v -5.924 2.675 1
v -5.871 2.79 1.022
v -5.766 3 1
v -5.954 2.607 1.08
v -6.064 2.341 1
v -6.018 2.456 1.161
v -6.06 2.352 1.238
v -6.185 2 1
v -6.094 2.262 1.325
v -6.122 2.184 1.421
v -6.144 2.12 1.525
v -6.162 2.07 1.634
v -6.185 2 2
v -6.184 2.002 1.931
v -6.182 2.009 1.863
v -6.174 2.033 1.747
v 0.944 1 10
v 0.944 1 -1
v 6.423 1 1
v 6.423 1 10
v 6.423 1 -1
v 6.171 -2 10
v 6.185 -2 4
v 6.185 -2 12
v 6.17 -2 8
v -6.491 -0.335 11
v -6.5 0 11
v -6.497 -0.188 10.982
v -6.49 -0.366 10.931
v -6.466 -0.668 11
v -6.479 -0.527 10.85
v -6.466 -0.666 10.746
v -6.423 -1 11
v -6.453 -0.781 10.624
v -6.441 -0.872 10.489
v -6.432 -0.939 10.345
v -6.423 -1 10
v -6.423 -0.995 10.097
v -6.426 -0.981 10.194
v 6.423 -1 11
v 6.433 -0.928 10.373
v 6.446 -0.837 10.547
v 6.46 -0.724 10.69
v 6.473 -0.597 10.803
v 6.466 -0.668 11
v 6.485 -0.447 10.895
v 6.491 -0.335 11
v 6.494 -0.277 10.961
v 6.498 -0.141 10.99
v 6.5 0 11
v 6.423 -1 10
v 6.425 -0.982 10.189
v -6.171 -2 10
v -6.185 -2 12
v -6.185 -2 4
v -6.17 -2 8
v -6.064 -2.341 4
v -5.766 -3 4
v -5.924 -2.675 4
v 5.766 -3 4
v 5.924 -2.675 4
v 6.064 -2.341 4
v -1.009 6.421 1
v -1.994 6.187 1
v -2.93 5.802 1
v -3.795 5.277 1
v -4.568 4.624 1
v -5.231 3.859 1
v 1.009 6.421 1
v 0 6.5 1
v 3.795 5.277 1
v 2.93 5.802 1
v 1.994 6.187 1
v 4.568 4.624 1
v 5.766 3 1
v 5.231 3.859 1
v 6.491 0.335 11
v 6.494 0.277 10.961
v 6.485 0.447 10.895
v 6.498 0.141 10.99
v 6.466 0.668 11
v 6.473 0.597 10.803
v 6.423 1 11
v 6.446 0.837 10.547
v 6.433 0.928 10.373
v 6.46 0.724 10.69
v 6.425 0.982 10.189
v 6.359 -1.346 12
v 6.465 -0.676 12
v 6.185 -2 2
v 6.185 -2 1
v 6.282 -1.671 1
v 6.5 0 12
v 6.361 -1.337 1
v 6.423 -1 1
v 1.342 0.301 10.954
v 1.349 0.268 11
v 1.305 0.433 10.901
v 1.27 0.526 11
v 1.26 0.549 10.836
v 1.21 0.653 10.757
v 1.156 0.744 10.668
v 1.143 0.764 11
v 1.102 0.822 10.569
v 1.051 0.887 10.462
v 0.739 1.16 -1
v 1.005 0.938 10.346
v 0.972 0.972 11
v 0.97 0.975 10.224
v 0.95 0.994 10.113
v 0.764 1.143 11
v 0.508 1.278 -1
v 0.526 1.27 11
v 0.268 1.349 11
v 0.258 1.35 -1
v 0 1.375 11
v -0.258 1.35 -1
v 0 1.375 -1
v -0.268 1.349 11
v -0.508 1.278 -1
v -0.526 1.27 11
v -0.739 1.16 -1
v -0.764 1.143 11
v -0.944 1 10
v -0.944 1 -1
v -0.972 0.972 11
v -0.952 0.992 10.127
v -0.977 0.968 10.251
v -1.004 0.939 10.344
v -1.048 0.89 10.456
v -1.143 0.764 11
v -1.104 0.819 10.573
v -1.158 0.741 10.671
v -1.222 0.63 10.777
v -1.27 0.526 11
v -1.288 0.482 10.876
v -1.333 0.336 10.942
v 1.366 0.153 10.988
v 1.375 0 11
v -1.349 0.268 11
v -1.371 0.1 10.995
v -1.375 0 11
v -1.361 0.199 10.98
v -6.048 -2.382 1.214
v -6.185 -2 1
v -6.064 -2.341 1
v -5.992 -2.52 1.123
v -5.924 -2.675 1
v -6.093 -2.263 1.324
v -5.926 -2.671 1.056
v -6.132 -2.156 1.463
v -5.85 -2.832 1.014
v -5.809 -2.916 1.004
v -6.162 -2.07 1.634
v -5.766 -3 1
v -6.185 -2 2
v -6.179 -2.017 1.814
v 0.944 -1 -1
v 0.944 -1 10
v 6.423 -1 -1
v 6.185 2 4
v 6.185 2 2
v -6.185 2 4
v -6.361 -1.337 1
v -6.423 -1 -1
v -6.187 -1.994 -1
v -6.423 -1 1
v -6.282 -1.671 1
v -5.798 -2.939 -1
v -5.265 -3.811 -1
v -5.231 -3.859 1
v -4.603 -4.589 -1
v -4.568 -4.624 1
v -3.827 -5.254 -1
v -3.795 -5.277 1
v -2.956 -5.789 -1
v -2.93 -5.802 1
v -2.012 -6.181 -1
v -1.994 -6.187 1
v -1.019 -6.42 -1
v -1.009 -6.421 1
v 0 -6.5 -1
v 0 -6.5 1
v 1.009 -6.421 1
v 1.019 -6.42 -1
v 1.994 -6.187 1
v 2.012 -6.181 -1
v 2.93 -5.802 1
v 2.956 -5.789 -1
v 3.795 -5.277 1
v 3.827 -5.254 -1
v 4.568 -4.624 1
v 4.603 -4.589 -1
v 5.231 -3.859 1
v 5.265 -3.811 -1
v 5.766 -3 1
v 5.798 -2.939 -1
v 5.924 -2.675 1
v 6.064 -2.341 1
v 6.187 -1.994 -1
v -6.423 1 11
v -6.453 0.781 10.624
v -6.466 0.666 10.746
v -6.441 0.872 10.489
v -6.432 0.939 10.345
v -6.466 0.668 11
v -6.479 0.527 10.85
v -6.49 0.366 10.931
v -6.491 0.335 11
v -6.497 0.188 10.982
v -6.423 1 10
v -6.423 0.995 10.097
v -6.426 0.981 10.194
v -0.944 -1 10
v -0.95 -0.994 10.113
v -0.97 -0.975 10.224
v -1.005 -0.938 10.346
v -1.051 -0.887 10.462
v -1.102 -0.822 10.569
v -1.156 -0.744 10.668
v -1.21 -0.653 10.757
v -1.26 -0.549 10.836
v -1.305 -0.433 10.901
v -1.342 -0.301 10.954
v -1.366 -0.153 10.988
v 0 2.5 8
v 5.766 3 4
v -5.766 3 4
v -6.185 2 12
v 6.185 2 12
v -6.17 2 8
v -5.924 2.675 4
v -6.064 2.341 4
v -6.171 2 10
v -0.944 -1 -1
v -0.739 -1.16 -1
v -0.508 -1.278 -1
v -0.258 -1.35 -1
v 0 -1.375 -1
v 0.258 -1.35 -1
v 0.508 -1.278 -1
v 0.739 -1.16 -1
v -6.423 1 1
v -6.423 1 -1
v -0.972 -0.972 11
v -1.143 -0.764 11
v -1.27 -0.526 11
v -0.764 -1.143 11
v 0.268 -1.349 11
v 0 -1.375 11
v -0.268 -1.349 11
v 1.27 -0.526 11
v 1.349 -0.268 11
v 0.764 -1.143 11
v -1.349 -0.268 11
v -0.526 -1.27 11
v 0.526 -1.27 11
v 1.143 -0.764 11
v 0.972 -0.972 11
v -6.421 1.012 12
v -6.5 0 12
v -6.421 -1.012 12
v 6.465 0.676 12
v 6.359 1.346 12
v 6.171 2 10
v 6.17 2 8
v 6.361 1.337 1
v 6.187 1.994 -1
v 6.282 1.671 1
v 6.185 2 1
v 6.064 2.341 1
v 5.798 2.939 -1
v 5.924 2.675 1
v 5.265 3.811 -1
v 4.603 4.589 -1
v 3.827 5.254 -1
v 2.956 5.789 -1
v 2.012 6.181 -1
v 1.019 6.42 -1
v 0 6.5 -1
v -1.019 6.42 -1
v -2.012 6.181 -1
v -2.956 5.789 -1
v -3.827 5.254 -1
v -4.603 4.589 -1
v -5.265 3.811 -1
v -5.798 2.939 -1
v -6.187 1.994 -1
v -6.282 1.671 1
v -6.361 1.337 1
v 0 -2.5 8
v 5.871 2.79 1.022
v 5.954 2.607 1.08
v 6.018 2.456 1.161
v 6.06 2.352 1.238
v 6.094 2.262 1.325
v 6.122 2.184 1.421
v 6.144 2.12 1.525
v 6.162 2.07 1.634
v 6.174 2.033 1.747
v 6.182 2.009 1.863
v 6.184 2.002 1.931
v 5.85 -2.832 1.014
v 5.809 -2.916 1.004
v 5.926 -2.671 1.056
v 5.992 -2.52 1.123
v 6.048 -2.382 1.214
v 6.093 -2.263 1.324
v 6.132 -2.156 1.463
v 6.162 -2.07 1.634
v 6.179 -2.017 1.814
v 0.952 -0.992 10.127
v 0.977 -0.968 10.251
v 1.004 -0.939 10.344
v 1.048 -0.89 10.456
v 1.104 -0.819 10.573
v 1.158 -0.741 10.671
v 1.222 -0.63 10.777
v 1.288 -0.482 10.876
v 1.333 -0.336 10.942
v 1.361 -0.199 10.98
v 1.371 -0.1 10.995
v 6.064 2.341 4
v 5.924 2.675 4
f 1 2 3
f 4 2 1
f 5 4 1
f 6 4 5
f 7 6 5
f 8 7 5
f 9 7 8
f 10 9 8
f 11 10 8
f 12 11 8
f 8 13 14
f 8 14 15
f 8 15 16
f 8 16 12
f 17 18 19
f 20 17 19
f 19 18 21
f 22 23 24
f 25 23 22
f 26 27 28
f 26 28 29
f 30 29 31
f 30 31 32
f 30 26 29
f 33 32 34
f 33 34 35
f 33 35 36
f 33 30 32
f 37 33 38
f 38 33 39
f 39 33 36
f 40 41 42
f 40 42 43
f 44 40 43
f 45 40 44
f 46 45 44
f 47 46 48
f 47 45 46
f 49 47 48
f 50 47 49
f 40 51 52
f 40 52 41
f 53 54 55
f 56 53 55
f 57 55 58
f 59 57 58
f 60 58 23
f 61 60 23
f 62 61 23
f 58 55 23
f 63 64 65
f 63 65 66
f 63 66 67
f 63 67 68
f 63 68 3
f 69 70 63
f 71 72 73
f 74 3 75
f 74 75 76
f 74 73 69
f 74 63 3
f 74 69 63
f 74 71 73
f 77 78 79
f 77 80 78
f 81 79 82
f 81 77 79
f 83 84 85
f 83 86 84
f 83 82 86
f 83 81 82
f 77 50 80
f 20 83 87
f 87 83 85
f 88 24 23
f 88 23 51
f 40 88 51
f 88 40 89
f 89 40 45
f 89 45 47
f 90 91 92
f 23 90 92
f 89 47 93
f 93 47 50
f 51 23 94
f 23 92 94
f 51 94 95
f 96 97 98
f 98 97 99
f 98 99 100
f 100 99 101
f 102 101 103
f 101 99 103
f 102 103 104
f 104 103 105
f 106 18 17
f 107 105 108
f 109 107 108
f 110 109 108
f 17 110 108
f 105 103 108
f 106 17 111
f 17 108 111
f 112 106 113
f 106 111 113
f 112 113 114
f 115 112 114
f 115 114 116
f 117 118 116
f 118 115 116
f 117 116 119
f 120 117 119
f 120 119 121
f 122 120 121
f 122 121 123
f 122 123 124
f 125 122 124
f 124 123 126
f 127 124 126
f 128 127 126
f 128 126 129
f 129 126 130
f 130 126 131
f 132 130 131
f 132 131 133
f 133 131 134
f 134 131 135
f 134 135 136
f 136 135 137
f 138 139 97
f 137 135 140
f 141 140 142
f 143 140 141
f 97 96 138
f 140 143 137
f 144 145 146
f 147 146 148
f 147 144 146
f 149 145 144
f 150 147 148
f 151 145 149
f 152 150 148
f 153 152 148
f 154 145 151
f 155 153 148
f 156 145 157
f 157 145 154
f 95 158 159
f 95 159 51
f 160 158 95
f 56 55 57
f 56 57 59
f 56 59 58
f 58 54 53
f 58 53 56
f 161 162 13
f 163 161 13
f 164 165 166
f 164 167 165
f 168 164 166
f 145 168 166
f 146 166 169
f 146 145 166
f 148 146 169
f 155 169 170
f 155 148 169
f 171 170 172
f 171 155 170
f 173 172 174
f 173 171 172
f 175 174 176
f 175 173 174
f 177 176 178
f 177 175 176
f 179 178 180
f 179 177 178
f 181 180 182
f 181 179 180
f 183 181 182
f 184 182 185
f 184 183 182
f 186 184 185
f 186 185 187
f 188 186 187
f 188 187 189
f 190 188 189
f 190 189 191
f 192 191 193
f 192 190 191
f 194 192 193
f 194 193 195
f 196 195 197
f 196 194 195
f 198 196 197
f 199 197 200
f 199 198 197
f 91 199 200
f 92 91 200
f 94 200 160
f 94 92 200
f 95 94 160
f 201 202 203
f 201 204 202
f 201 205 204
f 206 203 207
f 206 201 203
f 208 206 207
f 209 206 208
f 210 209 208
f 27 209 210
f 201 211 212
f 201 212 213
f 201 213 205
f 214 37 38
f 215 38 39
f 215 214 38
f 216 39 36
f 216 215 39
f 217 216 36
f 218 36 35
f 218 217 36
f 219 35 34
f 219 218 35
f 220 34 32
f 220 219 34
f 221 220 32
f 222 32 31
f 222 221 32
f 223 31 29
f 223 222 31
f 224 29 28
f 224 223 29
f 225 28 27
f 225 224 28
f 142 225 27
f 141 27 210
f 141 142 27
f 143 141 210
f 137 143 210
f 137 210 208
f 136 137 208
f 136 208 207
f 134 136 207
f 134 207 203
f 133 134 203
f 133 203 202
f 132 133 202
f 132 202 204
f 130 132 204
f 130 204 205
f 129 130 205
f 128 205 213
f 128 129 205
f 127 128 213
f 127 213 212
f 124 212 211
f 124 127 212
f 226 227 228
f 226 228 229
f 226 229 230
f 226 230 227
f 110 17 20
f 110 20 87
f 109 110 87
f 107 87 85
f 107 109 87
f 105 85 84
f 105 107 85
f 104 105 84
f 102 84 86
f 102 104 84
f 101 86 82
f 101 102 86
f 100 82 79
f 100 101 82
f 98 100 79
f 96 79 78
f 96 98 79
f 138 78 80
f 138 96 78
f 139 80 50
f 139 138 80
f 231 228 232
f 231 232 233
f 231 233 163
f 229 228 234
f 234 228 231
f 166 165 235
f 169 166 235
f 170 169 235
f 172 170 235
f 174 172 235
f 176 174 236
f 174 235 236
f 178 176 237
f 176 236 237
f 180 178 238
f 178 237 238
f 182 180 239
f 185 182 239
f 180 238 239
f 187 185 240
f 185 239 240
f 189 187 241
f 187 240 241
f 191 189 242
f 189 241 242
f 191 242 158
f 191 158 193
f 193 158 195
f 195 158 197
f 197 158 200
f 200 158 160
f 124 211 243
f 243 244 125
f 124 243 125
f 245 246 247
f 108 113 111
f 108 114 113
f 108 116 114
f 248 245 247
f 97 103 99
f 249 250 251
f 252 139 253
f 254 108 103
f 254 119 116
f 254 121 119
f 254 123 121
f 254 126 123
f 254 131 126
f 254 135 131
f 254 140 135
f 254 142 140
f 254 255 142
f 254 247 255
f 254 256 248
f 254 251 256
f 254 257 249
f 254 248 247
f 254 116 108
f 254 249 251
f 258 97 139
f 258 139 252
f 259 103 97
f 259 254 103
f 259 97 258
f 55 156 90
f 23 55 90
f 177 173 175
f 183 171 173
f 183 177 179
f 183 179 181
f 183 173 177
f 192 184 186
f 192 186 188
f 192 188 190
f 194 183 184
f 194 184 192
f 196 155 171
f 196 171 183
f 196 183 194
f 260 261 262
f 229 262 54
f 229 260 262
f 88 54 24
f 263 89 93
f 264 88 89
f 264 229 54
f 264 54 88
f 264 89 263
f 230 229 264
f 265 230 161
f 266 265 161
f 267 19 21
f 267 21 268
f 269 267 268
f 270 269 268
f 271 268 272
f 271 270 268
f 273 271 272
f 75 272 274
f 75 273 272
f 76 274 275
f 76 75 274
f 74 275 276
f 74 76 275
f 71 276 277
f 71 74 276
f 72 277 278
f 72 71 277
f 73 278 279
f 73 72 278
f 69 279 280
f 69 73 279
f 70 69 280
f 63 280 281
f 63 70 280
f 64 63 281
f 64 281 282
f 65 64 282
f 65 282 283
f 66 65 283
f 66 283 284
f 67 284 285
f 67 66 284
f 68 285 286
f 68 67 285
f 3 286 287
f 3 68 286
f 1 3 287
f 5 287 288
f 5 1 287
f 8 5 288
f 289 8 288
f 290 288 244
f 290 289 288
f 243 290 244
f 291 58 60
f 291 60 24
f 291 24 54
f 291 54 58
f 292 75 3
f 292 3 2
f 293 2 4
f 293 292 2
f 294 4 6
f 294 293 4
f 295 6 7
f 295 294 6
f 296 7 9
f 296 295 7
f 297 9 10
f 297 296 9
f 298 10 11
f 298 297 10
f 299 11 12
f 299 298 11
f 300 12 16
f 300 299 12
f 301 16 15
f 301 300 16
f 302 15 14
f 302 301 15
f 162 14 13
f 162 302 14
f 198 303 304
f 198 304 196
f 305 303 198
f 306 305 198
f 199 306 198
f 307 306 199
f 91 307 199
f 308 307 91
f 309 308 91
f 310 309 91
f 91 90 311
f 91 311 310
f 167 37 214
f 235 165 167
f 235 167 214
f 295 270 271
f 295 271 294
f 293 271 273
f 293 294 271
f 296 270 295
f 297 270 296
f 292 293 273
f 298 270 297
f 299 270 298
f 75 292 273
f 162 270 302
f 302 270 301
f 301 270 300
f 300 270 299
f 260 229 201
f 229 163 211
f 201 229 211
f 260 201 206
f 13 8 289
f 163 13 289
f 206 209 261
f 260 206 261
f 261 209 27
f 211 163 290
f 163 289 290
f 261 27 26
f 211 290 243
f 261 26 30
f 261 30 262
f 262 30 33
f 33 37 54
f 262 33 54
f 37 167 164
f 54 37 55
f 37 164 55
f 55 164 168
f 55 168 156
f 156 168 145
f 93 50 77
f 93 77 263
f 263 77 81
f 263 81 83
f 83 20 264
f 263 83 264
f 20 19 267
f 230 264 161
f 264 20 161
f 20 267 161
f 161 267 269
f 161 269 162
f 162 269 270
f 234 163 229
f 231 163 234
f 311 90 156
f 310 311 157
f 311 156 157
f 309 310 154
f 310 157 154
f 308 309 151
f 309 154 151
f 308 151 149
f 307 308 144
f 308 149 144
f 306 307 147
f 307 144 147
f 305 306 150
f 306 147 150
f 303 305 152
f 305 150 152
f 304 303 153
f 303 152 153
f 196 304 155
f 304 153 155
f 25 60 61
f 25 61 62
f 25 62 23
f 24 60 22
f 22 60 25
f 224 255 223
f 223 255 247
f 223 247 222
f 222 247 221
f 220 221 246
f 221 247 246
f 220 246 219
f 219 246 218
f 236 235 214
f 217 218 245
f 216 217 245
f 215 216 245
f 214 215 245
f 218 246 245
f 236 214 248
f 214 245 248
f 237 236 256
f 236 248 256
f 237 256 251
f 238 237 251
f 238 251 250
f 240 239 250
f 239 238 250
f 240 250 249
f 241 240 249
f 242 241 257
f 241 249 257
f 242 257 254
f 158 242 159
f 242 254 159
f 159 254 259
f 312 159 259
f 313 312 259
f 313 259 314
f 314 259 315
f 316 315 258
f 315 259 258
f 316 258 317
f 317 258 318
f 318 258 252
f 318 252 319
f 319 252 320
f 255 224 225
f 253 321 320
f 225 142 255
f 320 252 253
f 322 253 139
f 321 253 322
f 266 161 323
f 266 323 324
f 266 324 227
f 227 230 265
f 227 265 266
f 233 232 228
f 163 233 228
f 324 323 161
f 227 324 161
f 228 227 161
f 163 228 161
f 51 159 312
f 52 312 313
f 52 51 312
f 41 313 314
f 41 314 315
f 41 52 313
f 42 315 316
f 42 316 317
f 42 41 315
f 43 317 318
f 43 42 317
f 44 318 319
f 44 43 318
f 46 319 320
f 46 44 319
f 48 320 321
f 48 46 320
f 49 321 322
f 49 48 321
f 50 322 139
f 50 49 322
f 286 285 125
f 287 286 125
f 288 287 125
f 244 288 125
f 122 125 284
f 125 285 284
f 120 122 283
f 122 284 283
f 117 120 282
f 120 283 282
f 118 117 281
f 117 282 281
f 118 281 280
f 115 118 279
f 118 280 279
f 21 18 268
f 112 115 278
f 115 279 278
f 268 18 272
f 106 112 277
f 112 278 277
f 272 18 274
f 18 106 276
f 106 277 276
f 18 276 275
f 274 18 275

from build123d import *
from build123d import SkipClean  # not in build123d's __all__

# Parameters (mm, degrees)
F0_R          = 6.5
F1_DEPTH      = 1
F3_DEPTH      = 11
F7_R          = 1.375
F8_DEPTH      = 12
F9_W          = 46.4800073215
F9_H          = 2
F10_DEPTH     = 12
F11_T4_DEPTH  = 10.4788869849
F11_S5_R      = 1.375
F11_T6_DEPTH  = 7
F11_S7_R      = 6.5
F11_T8_DEPTH  = 7
F11_T12_DEPTH = 10.4788869849
F11_S13_R     = 6.5
F11_T14_DEPTH = 7
F11_S15_R     = 1.375
F11_T16_DEPTH = 7
F11_T20_DEPTH = 10.4788869849
F11_S21_R     = 1.375
F11_T22_DEPTH = 7
F11_S23_R     = 6.5
F11_T24_DEPTH = 7
F11_T28_DEPTH = 10.4788869849
F11_S29_R     = 1.375
F11_T30_DEPTH = 7
F11_S31_R     = 6.5
F11_T32_DEPTH = 7
F11_T36_DEPTH = 17.3693168769
F11_S37_R     = 6.5
F11_T38_DEPTH = 10
F11_T42_DEPTH = 17.3693168769
F11_S43_R     = 6.5
F11_T44_DEPTH = 10


# Not quite as in the source:
# - a fillet or chamfer that OpenCascade refuses, or shapes differently, is made with other operations: its cross-section is extruded or revolved along the edge and cut away or added
# - after a boolean that leaves OpenCascade's solid faulty, fix() repairs it


with BuildPart() as f1:
    # F0 (on Top) → F1 (new body, symmetric)
    with BuildSketch(Plane.XY):
        Circle(F0_R)
    extrude(amount=F1_DEPTH, both=True)

    # F2 (on face) → F3 (join)
    with BuildSketch(Plane.XY.offset(1)):
        with BuildLine():
            ThreePointArc((6.5, 0), (6.4206806434, 1.0123537302), (6.1846584384, 2))
            Line((6.1846584384, 2), (-6.1846584384, 2))
            ThreePointArc((-6.1846584384, 2), (-6.5, 0), (-6.1846584384, -2))
            Line((-6.1846584384, -2), (6.1846584384, -2))
            ThreePointArc((6.1846584384, -2), (6.4206806434, -1.0123537302), (6.5, 0))
        make_face()
    with SkipClean():  # cleaning this boolean's faces spoils the solid; the shape is the same uncleaned
        extrude(amount=F3_DEPTH)

    # F5 (on offset) → F6 section 0
    with BuildSketch(Plane.XY.offset(4)):
        with BuildLine():
            ThreePointArc((5.7662812973, -3), (6.5, 0), (5.7662812973, 3))
            Line((5.7662812973, 3), (-5.7662812973, 3))
            ThreePointArc((-5.7662812973, 3), (-6.5, 0), (-5.7662812973, -3))
            Line((-5.7662812973, -3), (5.7662812973, -3))
        make_face()
    # F3_face (on face) → F6 section 1
    with BuildSketch(Plane.XY.offset(12)):
        with BuildLine():
            ThreePointArc((6.1846584384, -2), (6.5, 0), (6.1846584384, 2))
            Line((6.1846584384, 2), (-6.1846584384, 2))
            ThreePointArc((-6.1846584384, 2), (-6.5, 0), (-6.1846584384, -2))
            Line((-6.1846584384, -2), (6.1846584384, -2))
        make_face()
    loft()

    add(f1.part.fix(), mode=Mode.REPLACE)

    # F7 (on face) → F8 (cut)
    with BuildSketch(Plane(origin=(0, 0, -1), x_dir=(1, 0, 0), z_dir=(0, 0, -1))):
        Circle(F7_R)
    extrude(amount=-F8_DEPTH, mode=Mode.SUBTRACT)

    # F9 (on face) → F10 (cut)
    with BuildSketch(Plane(origin=(0, 0, -1), x_dir=(1, 0, 0), z_dir=(0, 0, -1))):
        Rectangle(F9_W, F9_H)
    extrude(amount=-F10_DEPTH, mode=Mode.SUBTRACT)

    # F11: fillet of radius 1 on 8 edges, made by hand


with BuildPart() as f11_tool2:
    # F11_s3 → F11_t4 (new body)
    with BuildSketch(Plane.YZ.offset(-8.9226162893)):
        with BuildLine():
            ThreePointArc((0, 11), (0.7071067812, 10.7071067812), (1, 10))
            Line((1, 10), (1, 11))
            Line((1, 11), (0, 11))
        make_face()
    extrude(amount=F11_T4_DEPTH)

    # F11_s5 → F11_t6 (cut, symmetric)
    with BuildSketch(Plane.XY.offset(10.5)):
        Circle(F11_S5_R)
    extrude(amount=F11_T6_DEPTH, both=True, mode=Mode.SUBTRACT)

    # F11_s7 → F11_t8 (intersect, symmetric)
    with BuildSketch(Plane.XY.offset(10.5)):
        Circle(F11_S7_R)
    extrude(amount=F11_T8_DEPTH, both=True, mode=Mode.INTERSECT)


with BuildPart() as f1_1:
    add(f1.part, clean=False)

    # F11_t1: union F11_tool2
    add(f11_tool2.part)


with BuildPart() as f11_tool10:
    # F11_s11 → F11_t12 (new body)
    with BuildSketch(Plane.YZ.offset(-1.5562706956)):
        with BuildLine():
            ThreePointArc((1, 10), (0.7071067812, 10.7071067812), (0, 11))
            Line((0, 11), (1, 11))
            Line((1, 11), (1, 10))
        make_face()
    extrude(amount=F11_T12_DEPTH)

    # F11_s13 → F11_t14 (intersect, symmetric)
    with BuildSketch(Plane.XY.offset(10.5)):
        Circle(F11_S13_R)
    extrude(amount=F11_T14_DEPTH, both=True, mode=Mode.INTERSECT)

    # F11_s15 → F11_t16 (cut, symmetric)
    with BuildSketch(Plane.XY.offset(10.5)):
        Circle(F11_S15_R)
    extrude(amount=F11_T16_DEPTH, both=True, mode=Mode.SUBTRACT)


with BuildPart() as f1_2:
    add(f1_1.part, clean=False)

    # F11_t9: union F11_tool10
    add(f11_tool10.part)


with BuildPart() as f11_tool18:
    # F11_s19 → F11_t20 (new body)
    with BuildSketch(Plane.YZ.offset(8.9226162893)):
        with BuildLine():
            ThreePointArc((-1, 10), (-0.7071067812, 10.7071067812), (0, 11))
            Line((0, 11), (-1, 11))
            Line((-1, 11), (-1, 10))
        make_face()
    extrude(amount=-F11_T20_DEPTH)

    # F11_s21 → F11_t22 (cut, symmetric)
    with BuildSketch(Plane.XY.offset(10.5)):
        Circle(F11_S21_R)
    extrude(amount=F11_T22_DEPTH, both=True, mode=Mode.SUBTRACT)

    # F11_s23 → F11_t24 (intersect, symmetric)
    with BuildSketch(Plane.XY.offset(10.5)):
        Circle(F11_S23_R)
    extrude(amount=F11_T24_DEPTH, both=True, mode=Mode.INTERSECT)


with BuildPart() as f1_3:
    add(f1_2.part, clean=False)

    # F11_t17: union F11_tool18
    add(f11_tool18.part)


with BuildPart() as f11_tool26:
    # F11_s27 → F11_t28 (new body)
    with BuildSketch(Plane.YZ.offset(1.5562706956)):
        with BuildLine():
            ThreePointArc((0, 11), (-0.7071067812, 10.7071067812), (-1, 10))
            Line((-1, 10), (-1, 11))
            Line((-1, 11), (0, 11))
        make_face()
    extrude(amount=-F11_T28_DEPTH)

    # F11_s29 → F11_t30 (cut, symmetric)
    with BuildSketch(Plane.XY.offset(10.5)):
        Circle(F11_S29_R)
    extrude(amount=F11_T30_DEPTH, both=True, mode=Mode.SUBTRACT)

    # F11_s31 → F11_t32 (intersect, symmetric)
    with BuildSketch(Plane.XY.offset(10.5)):
        Circle(F11_S31_R)
    extrude(amount=F11_T32_DEPTH, both=True, mode=Mode.INTERSECT)


with BuildPart() as f1_4:
    add(f1_3.part, clean=False)

    # F11_t25: union F11_tool26
    add(f11_tool26.part)


with BuildPart() as f11_tool34:
    # F11_s35 → F11_t36 (new body)
    with BuildSketch(Plane.YZ.offset(8.6846584384)):
        with BuildLine():
            ThreePointArc((3, 1), (2.2928932188, 1.2928932188), (2, 2))
            Line((2, 2), (2, 1))
            Line((2, 1), (3, 1))
        make_face()
    extrude(amount=-F11_T36_DEPTH)

    # F11_s37 → F11_t38 (intersect, symmetric)
    with BuildSketch(Plane.XY.offset(1.5)):
        Circle(F11_S37_R)
    extrude(amount=F11_T38_DEPTH, both=True, mode=Mode.INTERSECT)


with BuildPart() as f1_5:
    add(f1_4.part, clean=False)

    # F11_t33: union F11_tool34
    add(f11_tool34.part)


with BuildPart() as f11_tool40:
    # F11_s41 → F11_t42 (new body)
    with BuildSketch(Plane.YZ.offset(-8.6846584384)):
        with BuildLine():
            ThreePointArc((-2, 2), (-2.2928932188, 1.2928932188), (-3, 1))
            Line((-3, 1), (-2, 1))
            Line((-2, 1), (-2, 2))
        make_face()
    extrude(amount=F11_T42_DEPTH)

    # F11_s43 → F11_t44 (intersect, symmetric)
    with BuildSketch(Plane.XY.offset(1.5)):
        Circle(F11_S43_R)
    extrude(amount=F11_T44_DEPTH, both=True, mode=Mode.INTERSECT)


with BuildPart() as f1_6:
    add(f1_5.part, clean=False)

    # F11_t39: union F11_tool40
    add(f11_tool40.part)


solid = f1_6.part
